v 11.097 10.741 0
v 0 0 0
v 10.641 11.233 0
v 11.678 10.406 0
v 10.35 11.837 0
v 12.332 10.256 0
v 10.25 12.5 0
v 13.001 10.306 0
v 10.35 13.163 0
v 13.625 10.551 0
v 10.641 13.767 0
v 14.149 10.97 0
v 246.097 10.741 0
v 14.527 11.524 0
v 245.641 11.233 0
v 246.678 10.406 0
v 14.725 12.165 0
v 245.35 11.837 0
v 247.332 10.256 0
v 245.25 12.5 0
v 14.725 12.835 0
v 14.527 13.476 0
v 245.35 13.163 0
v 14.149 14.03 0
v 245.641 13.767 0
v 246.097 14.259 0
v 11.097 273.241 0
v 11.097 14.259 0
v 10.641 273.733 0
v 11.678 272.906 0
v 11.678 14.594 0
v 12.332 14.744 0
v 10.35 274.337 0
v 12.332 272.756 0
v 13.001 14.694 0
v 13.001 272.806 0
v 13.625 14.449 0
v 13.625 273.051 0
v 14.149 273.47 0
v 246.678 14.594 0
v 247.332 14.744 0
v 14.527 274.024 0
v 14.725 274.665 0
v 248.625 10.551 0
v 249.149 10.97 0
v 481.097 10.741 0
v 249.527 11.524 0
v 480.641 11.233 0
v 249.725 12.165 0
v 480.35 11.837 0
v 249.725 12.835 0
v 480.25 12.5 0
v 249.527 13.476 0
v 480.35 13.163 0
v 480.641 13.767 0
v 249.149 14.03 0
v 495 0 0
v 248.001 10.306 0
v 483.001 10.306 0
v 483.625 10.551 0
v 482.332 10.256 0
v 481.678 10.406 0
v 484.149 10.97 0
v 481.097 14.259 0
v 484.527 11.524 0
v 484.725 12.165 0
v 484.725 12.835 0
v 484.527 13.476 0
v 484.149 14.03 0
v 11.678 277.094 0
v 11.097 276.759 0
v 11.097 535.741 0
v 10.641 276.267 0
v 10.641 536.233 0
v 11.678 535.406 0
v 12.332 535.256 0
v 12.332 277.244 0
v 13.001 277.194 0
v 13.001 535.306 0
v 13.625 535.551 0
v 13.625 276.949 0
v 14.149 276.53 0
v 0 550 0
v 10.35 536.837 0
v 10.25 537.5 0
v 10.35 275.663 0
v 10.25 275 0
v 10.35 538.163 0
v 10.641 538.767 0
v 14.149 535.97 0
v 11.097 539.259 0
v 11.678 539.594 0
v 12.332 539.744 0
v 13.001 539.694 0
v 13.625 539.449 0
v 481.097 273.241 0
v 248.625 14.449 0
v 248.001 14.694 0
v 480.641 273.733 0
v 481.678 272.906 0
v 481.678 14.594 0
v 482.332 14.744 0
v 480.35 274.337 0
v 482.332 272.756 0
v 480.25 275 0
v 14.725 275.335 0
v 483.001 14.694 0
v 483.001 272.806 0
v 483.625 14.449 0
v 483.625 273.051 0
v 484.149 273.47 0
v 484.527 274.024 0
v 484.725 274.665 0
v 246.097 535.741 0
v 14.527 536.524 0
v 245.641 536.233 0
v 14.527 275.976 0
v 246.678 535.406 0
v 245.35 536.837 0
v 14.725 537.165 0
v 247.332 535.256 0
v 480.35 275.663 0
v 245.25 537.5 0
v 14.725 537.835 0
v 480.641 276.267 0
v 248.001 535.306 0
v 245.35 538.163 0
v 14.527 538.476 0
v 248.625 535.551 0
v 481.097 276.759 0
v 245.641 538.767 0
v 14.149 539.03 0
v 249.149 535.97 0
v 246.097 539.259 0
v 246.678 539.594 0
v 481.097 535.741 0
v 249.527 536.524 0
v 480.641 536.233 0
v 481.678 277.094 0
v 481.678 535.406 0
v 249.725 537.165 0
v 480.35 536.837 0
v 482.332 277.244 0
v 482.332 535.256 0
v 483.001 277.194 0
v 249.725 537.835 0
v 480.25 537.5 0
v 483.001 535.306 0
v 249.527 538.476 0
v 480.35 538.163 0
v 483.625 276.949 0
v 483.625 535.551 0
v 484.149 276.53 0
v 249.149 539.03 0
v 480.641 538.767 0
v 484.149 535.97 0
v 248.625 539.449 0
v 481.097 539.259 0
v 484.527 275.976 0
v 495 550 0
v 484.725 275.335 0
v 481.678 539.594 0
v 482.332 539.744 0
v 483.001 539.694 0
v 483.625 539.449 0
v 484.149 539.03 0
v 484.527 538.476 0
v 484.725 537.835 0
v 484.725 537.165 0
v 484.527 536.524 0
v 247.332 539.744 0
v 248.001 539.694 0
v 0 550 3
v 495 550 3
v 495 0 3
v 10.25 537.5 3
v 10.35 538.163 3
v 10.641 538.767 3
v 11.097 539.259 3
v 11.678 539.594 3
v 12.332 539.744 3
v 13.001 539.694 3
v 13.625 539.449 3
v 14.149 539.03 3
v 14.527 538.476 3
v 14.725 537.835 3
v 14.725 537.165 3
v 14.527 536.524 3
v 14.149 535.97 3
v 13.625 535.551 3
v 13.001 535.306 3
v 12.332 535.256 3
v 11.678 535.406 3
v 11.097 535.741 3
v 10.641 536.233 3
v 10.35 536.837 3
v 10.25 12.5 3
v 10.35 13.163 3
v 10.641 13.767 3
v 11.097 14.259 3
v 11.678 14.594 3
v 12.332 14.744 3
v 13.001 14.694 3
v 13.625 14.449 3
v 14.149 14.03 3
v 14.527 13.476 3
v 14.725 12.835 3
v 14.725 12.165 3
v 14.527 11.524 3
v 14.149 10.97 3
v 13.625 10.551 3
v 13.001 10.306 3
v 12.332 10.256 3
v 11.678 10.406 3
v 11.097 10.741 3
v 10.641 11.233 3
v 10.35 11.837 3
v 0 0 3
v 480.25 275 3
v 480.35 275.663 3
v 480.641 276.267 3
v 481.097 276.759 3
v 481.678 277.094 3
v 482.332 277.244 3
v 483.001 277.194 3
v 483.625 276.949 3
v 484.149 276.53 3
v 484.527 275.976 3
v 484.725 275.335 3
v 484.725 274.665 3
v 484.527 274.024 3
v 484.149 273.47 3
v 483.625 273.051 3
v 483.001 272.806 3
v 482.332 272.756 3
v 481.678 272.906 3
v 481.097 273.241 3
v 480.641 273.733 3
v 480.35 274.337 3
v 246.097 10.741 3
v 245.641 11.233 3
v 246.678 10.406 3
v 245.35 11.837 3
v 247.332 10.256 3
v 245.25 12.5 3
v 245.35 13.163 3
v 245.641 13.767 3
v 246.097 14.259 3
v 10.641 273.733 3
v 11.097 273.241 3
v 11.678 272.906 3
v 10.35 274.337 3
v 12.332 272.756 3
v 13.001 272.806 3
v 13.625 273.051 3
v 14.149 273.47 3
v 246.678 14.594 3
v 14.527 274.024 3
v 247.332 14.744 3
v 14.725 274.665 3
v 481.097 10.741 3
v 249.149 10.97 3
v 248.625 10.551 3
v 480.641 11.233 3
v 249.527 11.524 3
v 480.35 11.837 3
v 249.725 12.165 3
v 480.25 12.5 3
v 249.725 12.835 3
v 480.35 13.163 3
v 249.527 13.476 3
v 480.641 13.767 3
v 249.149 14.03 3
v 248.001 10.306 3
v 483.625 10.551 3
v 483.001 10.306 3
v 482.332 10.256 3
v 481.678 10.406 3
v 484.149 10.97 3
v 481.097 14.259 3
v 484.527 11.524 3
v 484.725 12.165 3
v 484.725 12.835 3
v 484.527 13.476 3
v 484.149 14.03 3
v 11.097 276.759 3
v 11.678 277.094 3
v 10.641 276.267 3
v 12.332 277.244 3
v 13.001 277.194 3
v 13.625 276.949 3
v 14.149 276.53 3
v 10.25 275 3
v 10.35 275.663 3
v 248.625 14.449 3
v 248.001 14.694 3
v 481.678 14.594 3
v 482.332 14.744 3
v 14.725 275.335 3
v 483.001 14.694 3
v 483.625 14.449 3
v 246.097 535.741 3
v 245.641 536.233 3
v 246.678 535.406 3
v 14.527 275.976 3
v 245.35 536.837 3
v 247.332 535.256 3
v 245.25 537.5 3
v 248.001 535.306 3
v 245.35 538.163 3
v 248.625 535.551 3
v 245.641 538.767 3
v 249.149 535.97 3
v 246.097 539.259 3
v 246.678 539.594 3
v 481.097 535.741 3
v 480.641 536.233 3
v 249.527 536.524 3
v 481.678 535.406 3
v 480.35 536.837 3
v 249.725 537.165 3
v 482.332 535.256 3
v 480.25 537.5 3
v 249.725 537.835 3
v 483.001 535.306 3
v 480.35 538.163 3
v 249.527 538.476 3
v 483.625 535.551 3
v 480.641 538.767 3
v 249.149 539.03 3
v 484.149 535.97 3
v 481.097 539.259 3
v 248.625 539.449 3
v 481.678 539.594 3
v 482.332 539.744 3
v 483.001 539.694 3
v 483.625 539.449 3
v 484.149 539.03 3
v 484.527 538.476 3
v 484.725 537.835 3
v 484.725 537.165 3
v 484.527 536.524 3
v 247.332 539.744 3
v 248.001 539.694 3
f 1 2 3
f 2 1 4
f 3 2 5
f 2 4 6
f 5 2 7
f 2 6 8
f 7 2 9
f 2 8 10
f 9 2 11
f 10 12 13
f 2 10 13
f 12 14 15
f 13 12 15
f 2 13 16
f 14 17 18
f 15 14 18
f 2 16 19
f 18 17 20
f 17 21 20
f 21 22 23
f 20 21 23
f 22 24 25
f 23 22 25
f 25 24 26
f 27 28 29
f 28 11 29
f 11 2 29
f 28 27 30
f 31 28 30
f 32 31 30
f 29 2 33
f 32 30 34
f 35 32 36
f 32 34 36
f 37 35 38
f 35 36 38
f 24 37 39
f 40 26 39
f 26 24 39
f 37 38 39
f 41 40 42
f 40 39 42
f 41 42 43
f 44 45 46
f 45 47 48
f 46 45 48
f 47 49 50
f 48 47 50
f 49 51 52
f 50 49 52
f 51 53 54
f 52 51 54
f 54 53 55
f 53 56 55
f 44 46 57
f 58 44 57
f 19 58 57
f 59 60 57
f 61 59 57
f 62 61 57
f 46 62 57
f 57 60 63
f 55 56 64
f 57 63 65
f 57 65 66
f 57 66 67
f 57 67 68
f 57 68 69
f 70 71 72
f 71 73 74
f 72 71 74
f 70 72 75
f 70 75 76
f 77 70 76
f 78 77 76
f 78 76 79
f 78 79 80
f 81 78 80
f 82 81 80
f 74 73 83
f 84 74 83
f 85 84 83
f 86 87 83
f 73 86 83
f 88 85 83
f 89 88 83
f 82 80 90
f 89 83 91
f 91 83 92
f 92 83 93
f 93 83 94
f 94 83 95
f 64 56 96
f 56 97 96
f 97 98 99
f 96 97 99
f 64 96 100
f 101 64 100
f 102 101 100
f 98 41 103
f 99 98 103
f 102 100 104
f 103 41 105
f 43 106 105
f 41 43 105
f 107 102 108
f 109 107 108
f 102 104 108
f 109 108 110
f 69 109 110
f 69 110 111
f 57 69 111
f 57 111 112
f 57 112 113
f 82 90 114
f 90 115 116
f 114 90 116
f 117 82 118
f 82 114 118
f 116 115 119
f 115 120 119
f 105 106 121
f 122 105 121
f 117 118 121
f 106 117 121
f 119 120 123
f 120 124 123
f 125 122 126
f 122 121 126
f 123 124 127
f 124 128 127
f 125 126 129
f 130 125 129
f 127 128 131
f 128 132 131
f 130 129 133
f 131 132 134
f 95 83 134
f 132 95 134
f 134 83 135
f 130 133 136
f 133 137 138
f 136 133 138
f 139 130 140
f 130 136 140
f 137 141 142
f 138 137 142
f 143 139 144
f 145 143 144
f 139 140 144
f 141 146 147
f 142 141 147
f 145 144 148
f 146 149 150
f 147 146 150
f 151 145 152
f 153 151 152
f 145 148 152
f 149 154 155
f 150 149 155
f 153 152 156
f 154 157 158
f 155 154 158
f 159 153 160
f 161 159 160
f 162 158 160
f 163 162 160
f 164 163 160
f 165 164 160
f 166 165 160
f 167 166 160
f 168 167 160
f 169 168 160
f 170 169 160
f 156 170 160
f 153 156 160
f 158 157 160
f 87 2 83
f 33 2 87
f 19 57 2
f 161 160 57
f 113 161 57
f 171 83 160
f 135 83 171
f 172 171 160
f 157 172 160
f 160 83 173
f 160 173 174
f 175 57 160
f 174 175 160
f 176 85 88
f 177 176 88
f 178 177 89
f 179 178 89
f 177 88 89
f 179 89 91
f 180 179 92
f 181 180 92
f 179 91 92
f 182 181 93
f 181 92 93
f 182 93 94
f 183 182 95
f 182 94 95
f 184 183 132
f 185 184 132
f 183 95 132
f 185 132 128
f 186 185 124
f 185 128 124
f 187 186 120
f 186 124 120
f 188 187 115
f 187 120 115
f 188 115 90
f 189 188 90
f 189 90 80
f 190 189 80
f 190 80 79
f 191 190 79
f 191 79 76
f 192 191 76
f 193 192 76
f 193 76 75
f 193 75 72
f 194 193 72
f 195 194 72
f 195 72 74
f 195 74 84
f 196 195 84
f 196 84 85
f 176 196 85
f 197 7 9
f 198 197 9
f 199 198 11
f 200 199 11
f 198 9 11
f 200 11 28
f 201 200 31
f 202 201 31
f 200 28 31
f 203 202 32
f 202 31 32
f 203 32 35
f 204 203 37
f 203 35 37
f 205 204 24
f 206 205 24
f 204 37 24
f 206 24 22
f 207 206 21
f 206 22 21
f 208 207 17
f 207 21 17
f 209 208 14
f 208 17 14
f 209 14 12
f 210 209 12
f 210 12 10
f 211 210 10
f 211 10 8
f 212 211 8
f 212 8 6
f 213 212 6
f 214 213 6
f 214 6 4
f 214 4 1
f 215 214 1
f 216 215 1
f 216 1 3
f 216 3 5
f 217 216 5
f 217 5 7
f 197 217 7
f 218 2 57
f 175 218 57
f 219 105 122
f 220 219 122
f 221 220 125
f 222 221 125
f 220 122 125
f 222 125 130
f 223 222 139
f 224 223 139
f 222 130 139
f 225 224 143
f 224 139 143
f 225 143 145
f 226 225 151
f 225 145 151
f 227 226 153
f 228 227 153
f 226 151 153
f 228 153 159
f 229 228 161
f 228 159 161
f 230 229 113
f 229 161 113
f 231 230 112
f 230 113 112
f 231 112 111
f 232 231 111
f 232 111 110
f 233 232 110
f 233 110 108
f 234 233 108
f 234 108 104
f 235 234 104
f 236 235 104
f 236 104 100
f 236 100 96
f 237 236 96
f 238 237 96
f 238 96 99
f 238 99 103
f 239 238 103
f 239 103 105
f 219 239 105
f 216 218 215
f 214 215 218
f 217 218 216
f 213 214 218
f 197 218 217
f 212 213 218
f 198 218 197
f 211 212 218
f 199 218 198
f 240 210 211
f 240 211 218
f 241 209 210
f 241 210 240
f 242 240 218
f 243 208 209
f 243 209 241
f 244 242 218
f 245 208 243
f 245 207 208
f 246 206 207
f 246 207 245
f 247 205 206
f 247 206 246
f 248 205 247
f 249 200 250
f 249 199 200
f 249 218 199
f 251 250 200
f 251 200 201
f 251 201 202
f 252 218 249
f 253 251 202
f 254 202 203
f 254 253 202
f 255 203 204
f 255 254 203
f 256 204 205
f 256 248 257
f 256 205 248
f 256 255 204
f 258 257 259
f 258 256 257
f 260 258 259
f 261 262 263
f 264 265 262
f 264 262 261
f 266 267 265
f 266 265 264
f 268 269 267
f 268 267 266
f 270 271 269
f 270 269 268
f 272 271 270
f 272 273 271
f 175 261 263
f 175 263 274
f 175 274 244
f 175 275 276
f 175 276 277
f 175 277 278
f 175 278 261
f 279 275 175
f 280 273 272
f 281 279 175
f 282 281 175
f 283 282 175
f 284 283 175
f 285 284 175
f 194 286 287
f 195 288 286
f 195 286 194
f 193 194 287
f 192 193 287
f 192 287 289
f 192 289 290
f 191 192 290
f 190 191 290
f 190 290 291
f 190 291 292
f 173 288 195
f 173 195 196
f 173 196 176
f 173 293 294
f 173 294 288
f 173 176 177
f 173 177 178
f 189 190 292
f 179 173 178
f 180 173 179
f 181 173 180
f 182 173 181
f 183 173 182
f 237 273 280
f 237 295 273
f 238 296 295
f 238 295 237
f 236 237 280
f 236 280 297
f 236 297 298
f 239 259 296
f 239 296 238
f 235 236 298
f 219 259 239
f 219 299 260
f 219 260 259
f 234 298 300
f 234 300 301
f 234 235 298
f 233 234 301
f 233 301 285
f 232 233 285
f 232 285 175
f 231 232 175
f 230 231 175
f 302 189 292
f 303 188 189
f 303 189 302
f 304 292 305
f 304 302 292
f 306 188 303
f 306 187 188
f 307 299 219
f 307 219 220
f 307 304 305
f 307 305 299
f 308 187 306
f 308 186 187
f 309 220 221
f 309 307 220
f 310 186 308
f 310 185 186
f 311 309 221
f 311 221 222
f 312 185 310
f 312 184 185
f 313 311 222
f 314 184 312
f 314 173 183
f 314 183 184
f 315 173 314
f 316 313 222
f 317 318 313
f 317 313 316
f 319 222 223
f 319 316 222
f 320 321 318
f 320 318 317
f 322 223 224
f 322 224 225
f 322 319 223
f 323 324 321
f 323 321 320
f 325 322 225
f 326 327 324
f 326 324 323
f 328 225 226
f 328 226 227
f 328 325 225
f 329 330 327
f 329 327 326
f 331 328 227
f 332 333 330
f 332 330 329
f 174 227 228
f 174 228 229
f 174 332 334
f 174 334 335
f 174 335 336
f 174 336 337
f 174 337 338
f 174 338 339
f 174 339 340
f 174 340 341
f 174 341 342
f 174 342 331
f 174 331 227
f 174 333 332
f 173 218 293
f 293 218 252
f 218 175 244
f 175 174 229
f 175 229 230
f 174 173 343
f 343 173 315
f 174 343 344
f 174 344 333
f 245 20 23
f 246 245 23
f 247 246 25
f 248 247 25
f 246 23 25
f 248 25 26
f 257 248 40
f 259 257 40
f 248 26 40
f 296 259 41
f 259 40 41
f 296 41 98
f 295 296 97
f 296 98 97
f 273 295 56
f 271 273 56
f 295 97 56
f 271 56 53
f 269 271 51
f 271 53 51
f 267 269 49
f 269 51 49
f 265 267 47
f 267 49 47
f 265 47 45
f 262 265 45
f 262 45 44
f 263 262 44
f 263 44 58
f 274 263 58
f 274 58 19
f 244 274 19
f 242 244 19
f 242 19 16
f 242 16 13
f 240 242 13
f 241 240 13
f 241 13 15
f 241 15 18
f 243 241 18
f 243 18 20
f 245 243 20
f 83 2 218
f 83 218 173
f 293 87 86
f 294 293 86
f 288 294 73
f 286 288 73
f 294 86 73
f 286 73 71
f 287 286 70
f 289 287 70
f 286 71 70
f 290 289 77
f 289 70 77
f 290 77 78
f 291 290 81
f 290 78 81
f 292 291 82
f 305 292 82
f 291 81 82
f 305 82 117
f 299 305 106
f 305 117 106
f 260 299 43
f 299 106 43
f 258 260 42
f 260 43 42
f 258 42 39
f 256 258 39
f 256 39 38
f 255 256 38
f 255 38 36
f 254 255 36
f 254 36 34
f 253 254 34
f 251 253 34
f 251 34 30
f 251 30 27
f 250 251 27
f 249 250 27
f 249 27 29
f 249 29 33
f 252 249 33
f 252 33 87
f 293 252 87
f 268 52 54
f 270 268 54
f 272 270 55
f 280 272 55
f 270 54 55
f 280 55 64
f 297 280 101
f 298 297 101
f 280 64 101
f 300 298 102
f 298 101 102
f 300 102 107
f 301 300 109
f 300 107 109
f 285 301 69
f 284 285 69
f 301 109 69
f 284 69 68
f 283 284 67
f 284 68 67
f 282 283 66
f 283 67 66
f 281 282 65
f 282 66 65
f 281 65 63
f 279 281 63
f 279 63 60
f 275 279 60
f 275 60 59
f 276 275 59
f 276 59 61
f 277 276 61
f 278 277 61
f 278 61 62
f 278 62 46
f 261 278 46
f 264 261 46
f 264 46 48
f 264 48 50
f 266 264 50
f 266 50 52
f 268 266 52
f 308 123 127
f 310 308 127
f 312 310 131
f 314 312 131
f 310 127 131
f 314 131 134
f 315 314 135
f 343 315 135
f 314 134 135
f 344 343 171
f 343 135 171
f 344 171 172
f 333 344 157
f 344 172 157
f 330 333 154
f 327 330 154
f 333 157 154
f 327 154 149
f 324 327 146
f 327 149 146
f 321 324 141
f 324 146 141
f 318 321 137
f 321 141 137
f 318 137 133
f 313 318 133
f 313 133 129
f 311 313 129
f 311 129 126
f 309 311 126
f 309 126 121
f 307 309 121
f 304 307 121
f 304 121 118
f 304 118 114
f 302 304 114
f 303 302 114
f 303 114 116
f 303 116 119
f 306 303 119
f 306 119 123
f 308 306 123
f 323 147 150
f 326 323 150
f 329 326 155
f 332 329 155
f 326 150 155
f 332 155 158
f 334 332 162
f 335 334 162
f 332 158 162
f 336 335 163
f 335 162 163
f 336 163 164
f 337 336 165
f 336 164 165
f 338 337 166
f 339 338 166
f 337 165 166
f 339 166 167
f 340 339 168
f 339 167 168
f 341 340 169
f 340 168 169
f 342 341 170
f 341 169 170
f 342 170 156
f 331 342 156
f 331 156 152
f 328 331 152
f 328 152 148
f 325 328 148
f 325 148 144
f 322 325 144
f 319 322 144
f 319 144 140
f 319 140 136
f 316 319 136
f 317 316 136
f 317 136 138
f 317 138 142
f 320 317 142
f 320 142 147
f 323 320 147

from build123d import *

# Parameters (mm, degrees)
SKETCH1_W            = 495
SKETCH1_H            = 550
BOSS_EXTRUDE1_DEPTH  = 3
M4_CLEARANCE_HOLE1_D = 4.5


with BuildPart() as part:
    # Sketch1 → Boss-Extrude1 (new body)
    with BuildSketch(Plane.XY):
        with Locations((247.5, 275)):
            Rectangle(SKETCH1_W, SKETCH1_H)
    extrude(amount=BOSS_EXTRUDE1_DEPTH)

    # M4 Clearance Hole1 (through all)
    with Locations(Plane.XY.offset(3)):
        with Locations((12.5, 275), (12.5, 537.5), (12.5, 12.5), (247.5, 12.5), (482.5, 12.5), (482.5, 275), (482.5, 537.5), (247.5, 537.5)):
            Hole(M4_CLEARANCE_HOLE1_D / 2)


solid = part.part
